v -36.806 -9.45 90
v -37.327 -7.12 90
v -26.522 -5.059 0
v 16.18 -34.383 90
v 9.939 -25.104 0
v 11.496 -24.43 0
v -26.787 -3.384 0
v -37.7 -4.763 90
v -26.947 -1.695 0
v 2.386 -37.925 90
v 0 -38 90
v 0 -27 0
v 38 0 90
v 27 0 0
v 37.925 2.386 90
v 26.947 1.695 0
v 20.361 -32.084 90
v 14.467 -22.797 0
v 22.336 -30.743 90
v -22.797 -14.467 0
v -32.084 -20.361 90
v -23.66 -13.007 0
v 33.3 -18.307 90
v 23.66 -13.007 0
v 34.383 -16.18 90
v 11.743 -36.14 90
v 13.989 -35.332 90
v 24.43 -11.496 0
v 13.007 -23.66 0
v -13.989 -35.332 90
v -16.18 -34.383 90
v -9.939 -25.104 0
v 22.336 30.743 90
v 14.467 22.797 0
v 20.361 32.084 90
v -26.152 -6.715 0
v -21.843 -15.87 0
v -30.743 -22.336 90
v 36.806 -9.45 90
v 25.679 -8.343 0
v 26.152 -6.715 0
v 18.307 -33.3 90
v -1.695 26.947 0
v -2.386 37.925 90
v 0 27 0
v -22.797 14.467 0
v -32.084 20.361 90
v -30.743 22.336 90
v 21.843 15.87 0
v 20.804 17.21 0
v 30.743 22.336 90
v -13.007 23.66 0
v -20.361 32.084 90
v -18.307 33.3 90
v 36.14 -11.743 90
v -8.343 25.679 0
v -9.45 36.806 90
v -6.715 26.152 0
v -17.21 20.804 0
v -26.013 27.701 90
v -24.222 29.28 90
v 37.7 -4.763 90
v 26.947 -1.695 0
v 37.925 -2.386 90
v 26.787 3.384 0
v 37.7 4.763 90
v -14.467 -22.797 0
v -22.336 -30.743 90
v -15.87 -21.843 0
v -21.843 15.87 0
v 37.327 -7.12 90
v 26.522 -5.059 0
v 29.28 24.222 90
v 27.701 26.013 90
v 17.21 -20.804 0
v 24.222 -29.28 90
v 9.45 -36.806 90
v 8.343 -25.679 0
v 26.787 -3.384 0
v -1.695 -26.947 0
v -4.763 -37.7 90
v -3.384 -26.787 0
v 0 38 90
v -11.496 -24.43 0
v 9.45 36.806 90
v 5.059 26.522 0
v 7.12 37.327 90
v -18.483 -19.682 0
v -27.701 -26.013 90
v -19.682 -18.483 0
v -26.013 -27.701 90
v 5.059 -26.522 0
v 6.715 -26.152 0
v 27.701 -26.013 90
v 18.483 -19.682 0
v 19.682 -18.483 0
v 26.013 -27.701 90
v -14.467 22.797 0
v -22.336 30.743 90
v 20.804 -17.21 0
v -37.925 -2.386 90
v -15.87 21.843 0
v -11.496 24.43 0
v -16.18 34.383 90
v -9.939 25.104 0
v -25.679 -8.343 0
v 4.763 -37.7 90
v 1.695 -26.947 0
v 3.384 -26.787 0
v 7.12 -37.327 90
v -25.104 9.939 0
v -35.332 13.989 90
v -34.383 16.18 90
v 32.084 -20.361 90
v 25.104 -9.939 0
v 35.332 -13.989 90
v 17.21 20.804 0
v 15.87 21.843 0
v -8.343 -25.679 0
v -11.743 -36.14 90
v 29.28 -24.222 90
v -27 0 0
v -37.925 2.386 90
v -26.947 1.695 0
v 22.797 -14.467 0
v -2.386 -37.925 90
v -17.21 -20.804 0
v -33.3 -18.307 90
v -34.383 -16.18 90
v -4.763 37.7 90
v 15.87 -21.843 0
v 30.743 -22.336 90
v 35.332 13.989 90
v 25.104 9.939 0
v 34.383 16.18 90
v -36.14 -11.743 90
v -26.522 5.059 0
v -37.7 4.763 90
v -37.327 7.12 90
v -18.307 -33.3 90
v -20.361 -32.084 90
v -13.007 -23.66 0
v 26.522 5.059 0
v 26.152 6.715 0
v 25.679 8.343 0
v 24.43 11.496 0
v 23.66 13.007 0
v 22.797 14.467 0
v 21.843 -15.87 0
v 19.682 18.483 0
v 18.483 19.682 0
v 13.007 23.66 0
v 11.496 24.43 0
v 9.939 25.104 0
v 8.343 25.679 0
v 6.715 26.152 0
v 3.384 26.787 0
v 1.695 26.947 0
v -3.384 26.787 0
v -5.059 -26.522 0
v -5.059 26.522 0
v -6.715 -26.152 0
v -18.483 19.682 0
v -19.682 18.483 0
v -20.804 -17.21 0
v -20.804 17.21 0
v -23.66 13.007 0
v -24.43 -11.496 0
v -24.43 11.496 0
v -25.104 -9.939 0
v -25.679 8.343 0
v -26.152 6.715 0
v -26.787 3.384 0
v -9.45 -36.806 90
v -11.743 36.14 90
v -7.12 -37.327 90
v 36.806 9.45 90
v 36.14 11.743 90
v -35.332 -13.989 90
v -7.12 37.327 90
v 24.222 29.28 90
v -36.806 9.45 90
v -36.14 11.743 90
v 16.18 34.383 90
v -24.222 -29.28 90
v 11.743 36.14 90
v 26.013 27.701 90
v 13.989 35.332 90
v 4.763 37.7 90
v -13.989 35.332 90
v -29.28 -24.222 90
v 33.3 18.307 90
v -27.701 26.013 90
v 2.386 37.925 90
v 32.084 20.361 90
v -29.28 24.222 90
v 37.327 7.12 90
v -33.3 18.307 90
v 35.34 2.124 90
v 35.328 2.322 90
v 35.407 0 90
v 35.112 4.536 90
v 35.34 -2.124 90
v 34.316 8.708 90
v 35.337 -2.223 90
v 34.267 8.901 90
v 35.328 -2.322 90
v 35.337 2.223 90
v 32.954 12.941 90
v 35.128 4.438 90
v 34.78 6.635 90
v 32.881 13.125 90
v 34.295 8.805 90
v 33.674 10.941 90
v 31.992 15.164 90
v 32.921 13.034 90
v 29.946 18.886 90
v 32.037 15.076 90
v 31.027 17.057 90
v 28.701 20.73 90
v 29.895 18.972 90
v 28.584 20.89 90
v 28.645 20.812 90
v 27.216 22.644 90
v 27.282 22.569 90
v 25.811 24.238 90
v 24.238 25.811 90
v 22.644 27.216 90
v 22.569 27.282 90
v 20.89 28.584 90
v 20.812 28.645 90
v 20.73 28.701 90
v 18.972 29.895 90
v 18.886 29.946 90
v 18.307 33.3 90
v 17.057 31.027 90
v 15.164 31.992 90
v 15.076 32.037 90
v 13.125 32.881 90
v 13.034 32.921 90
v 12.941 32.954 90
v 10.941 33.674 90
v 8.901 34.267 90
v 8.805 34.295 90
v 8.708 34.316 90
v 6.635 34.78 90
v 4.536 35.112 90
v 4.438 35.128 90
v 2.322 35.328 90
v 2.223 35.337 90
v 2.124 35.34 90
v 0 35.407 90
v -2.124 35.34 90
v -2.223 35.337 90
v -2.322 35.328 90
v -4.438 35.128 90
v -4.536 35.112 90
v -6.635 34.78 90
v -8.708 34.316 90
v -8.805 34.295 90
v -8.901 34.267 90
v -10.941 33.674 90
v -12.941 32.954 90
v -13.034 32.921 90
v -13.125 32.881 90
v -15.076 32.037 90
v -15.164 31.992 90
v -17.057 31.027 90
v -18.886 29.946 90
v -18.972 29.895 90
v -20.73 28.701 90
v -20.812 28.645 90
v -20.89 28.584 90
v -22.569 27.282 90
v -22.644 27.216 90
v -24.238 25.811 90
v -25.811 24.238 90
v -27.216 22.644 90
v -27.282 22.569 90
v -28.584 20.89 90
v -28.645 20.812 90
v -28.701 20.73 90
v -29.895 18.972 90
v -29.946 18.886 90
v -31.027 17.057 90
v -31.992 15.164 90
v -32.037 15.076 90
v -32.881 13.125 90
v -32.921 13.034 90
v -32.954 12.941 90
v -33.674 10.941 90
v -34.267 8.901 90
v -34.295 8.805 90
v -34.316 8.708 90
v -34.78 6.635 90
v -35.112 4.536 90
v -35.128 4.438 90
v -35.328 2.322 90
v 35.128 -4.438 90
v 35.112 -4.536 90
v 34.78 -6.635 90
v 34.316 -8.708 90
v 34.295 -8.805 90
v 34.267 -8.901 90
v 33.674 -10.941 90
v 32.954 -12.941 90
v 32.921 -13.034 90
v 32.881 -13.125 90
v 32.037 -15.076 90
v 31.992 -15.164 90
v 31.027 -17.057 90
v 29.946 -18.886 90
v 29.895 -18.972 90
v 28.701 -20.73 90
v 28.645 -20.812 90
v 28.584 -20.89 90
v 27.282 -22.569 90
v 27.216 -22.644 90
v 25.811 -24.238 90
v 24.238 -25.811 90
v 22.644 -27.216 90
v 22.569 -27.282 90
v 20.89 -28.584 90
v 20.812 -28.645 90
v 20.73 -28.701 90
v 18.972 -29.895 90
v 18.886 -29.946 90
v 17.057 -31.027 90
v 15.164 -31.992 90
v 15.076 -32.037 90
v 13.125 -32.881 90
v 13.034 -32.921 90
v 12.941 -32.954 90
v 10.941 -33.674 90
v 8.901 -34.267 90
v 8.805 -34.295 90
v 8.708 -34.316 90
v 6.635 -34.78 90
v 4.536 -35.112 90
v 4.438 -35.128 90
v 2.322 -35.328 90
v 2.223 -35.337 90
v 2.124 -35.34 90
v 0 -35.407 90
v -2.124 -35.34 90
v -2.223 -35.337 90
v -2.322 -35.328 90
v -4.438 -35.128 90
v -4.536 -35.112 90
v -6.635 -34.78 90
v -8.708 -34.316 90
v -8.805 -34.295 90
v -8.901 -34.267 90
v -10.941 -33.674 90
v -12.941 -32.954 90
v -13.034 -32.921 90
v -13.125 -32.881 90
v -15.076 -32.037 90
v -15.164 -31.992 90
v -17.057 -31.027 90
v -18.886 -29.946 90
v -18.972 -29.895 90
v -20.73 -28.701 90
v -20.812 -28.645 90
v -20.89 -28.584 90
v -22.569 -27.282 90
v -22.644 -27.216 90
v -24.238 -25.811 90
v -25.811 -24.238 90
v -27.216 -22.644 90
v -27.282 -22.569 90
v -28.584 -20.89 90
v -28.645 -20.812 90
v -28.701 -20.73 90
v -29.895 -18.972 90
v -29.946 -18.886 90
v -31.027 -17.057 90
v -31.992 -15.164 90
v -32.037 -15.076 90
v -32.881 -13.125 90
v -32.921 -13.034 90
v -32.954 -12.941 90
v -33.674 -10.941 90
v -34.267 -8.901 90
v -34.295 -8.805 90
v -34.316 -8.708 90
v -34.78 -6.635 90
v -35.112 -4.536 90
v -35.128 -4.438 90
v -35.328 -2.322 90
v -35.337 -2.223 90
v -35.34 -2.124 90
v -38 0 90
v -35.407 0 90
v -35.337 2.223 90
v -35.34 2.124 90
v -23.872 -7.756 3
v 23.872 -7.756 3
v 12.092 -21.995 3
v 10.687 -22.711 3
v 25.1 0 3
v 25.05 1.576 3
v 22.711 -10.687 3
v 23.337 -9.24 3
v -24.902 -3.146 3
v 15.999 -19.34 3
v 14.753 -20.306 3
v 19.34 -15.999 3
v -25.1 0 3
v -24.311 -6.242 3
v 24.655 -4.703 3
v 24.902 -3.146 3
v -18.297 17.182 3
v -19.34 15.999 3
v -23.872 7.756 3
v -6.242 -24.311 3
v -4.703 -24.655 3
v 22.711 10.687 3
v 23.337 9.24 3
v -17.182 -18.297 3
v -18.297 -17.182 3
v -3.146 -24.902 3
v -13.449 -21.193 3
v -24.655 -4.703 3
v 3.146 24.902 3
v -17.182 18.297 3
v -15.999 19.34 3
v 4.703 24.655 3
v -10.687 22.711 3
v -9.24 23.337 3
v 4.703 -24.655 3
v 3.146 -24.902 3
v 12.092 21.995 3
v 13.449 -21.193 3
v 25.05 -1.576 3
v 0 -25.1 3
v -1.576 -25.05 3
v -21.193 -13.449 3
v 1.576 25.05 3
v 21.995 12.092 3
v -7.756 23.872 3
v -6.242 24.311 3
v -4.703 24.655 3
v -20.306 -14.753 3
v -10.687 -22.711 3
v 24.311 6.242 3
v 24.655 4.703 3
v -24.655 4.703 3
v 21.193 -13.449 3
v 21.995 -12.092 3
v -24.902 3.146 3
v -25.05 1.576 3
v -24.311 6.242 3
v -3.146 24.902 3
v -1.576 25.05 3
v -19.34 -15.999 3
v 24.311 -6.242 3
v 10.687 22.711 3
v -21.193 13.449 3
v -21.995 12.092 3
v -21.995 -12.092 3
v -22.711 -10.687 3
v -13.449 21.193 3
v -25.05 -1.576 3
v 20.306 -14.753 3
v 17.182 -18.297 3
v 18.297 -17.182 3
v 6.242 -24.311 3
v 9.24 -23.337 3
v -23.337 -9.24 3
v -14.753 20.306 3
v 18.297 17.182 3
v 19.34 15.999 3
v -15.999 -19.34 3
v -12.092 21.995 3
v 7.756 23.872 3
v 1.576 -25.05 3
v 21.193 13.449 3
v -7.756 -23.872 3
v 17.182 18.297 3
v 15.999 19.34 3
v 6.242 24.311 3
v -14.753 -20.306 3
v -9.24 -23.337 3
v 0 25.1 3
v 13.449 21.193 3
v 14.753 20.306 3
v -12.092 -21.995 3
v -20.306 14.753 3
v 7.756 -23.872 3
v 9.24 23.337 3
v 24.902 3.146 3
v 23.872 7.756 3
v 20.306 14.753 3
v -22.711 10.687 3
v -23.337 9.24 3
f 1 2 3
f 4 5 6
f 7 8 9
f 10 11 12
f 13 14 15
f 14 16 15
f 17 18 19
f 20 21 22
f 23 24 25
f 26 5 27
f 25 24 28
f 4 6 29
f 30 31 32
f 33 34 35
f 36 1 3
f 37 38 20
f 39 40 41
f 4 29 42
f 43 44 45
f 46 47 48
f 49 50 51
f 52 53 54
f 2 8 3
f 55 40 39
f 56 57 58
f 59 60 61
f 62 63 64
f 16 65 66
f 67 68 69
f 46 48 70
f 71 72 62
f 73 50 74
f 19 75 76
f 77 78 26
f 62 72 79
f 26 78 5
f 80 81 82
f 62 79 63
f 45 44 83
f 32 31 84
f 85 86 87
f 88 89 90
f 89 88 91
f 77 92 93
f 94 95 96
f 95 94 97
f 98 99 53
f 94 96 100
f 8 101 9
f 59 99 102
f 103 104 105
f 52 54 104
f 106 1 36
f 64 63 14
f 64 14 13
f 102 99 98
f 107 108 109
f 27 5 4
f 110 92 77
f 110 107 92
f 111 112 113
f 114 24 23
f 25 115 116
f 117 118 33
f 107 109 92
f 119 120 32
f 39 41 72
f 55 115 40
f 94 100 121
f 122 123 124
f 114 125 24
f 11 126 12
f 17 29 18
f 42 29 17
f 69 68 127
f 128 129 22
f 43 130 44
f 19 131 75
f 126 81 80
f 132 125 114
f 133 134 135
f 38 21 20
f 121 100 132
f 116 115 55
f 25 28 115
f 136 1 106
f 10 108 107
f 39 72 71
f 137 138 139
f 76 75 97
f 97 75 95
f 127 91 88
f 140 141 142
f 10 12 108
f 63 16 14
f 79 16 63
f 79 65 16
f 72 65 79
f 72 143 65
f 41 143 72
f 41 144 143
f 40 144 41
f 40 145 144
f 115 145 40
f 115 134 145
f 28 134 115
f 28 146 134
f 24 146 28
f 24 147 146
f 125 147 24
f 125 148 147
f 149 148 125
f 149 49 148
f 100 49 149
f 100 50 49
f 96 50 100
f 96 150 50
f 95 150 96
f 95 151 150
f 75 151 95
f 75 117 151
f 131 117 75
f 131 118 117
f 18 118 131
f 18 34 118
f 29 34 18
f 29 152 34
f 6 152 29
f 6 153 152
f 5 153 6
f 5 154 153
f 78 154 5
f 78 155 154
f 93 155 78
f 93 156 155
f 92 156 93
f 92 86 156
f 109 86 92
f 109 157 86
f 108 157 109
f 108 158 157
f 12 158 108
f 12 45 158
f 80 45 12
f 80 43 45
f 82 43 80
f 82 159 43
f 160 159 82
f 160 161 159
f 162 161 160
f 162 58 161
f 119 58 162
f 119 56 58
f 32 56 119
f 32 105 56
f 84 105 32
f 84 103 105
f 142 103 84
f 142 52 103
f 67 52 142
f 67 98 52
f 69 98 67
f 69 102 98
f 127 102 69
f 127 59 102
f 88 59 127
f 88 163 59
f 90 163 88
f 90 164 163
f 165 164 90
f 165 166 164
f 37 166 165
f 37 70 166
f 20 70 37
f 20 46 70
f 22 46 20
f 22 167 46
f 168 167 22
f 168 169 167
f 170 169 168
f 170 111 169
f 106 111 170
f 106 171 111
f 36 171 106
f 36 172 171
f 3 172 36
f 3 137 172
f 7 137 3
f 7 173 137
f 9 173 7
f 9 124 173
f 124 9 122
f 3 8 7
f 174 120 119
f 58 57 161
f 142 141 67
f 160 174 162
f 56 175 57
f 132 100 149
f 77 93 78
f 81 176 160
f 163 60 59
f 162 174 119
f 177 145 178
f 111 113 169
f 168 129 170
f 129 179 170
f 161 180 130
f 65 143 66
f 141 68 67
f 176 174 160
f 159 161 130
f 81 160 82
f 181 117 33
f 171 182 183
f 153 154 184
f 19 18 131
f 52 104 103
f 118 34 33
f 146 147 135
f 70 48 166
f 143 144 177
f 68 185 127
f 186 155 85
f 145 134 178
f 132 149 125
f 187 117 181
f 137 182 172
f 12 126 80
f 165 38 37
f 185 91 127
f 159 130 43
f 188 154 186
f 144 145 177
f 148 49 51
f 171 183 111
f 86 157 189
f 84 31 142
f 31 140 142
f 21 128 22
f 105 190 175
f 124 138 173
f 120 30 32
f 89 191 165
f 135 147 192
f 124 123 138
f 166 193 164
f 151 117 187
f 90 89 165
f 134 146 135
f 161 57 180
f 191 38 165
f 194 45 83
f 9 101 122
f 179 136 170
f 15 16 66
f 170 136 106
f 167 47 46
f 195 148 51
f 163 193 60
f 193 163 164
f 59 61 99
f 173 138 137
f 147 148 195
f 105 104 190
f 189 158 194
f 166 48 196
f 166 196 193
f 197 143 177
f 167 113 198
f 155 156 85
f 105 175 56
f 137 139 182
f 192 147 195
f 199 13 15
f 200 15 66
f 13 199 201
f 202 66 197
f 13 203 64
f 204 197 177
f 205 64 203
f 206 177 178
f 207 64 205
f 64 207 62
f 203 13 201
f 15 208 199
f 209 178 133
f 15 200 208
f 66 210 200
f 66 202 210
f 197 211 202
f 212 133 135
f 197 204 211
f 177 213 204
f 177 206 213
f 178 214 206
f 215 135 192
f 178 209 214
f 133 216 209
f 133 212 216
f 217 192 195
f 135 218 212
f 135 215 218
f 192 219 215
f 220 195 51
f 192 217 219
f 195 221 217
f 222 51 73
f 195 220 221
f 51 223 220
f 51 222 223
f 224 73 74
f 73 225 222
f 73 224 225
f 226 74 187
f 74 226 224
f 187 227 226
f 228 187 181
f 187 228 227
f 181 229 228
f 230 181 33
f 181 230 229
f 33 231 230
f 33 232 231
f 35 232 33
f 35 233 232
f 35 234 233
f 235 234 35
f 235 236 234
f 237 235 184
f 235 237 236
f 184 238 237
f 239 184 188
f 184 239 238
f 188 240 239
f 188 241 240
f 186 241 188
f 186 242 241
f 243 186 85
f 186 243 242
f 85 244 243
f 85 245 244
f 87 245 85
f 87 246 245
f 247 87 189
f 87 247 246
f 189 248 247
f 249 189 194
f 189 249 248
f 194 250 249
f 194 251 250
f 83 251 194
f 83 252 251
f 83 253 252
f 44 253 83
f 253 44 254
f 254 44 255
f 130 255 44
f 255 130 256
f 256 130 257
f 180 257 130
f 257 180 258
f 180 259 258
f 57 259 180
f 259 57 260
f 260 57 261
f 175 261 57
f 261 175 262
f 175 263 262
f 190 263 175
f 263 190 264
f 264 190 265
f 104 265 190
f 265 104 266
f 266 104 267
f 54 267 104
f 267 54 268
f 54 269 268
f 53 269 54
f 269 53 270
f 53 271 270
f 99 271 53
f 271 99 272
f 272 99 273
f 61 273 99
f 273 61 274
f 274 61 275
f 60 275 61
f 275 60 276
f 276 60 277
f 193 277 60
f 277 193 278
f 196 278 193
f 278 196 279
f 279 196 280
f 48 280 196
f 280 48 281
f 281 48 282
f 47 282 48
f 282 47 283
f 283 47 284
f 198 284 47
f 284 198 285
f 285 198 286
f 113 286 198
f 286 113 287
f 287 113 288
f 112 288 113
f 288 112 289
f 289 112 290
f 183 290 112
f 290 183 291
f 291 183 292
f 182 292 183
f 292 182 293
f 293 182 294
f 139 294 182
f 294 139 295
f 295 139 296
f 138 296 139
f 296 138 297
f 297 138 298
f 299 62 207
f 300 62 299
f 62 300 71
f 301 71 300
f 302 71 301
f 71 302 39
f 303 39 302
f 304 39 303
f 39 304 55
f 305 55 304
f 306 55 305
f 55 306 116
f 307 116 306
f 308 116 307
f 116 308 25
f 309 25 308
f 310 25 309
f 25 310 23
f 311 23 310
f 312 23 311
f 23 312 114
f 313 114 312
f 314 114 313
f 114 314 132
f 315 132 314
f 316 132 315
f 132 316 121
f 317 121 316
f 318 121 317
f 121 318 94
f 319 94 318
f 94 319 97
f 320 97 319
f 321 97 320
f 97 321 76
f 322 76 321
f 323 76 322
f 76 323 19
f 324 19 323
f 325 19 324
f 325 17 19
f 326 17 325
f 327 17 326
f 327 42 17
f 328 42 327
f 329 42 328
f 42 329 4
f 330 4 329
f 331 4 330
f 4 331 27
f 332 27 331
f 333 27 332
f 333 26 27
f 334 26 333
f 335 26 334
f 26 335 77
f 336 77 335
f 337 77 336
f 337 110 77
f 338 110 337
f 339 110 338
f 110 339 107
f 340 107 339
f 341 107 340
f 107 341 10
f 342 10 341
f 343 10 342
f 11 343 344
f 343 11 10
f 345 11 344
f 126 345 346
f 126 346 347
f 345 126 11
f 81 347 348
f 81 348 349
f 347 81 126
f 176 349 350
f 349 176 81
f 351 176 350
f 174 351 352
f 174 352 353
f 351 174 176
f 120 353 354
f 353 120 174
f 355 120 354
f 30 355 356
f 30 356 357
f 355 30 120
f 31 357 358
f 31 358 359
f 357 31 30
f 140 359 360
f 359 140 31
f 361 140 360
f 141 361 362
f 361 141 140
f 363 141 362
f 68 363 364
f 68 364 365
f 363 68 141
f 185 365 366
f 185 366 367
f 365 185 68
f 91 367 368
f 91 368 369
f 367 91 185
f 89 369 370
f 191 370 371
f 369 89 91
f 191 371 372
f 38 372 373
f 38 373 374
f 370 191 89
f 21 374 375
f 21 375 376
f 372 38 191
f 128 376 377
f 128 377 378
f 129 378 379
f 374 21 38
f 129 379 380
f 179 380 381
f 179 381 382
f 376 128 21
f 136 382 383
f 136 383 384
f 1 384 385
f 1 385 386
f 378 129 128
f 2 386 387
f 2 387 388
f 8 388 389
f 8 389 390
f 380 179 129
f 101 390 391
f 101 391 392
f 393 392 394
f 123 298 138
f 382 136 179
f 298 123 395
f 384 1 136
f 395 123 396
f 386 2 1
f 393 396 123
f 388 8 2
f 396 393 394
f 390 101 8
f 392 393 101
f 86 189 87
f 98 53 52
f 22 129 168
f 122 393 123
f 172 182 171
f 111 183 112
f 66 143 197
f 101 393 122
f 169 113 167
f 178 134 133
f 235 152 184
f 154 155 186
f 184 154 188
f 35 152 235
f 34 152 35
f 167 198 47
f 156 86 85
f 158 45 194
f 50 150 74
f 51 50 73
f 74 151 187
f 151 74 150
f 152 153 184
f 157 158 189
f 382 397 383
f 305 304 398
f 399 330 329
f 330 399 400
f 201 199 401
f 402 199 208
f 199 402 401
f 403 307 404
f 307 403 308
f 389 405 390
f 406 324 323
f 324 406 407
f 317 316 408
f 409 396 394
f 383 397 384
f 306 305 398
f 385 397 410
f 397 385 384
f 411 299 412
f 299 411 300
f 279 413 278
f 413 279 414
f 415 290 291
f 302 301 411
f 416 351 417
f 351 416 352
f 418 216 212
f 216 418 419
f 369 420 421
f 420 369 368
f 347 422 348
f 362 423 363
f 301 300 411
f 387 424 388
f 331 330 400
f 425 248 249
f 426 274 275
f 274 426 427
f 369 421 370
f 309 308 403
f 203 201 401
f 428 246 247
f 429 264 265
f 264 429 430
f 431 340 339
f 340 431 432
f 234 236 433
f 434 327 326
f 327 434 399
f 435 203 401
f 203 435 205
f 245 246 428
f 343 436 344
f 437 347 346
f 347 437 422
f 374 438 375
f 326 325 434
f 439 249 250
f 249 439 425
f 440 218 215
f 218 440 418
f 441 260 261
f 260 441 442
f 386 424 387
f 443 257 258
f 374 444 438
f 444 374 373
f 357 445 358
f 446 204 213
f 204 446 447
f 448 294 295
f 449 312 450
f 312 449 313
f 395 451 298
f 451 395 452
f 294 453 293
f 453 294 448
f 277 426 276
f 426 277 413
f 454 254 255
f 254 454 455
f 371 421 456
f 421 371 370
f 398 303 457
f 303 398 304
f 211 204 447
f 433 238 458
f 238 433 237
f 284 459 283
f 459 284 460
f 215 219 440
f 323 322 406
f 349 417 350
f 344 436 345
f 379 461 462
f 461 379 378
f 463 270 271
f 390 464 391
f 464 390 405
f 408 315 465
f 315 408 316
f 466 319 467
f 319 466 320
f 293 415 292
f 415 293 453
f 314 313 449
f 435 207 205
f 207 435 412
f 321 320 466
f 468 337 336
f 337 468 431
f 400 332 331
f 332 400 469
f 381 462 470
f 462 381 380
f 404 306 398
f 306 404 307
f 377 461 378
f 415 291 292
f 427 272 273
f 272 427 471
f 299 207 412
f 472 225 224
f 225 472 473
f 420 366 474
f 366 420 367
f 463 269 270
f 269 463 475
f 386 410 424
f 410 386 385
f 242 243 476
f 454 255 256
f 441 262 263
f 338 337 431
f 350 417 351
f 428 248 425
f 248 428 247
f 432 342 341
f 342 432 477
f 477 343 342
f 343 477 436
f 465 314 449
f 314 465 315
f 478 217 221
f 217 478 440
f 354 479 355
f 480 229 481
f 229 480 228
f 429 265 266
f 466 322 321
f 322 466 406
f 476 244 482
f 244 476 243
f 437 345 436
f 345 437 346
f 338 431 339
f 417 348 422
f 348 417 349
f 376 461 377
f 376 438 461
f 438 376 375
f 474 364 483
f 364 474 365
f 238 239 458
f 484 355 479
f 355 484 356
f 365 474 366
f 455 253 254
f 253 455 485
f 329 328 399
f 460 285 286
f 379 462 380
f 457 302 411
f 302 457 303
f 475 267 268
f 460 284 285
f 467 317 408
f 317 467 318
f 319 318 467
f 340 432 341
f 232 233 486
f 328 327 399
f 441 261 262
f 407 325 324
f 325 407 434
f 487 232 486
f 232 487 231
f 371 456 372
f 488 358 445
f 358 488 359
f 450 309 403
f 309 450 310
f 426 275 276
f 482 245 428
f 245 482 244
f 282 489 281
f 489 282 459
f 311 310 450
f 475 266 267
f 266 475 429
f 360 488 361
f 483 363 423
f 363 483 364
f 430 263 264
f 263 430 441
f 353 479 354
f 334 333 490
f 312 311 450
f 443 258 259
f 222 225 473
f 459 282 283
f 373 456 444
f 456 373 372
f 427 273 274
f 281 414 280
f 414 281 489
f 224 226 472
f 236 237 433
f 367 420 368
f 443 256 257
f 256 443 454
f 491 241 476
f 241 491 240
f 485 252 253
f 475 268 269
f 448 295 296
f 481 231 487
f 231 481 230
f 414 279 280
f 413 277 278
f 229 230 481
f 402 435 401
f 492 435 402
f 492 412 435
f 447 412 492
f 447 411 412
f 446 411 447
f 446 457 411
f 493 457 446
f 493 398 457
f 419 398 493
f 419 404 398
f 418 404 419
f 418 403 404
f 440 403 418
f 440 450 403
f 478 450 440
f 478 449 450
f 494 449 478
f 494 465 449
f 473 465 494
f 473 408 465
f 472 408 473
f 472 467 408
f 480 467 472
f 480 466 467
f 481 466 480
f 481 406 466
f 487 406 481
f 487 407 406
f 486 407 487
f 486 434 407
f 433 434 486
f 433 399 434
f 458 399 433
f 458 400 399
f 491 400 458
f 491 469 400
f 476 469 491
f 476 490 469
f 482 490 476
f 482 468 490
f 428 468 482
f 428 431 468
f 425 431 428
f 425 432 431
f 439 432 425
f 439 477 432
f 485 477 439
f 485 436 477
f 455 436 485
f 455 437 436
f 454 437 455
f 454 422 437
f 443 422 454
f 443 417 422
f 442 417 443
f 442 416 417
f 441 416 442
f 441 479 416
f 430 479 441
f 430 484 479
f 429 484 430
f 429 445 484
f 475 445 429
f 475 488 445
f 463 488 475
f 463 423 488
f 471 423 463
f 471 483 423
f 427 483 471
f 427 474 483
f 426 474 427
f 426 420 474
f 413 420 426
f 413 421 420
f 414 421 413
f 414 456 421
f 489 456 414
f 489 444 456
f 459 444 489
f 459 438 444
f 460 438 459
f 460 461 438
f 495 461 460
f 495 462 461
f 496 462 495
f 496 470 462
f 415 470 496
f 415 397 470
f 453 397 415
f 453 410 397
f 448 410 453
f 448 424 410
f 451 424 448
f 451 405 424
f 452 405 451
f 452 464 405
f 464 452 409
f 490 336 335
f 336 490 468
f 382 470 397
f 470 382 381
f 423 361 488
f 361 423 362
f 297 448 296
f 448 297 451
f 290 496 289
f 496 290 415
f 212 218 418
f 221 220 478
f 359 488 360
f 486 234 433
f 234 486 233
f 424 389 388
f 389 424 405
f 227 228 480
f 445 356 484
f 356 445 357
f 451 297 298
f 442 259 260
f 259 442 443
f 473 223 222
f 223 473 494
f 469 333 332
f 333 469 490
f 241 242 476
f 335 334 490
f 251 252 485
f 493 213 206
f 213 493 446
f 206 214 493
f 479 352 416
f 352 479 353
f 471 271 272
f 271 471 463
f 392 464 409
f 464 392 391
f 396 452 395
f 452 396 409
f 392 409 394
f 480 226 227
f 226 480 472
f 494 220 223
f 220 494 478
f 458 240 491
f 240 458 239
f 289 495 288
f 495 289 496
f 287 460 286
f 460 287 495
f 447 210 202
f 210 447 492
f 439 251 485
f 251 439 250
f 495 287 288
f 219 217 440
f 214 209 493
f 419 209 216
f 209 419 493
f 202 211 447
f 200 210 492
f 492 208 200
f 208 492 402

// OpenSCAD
// Move the height of  the glass.
height =90; // [10:150]


// Move the first radius (bottom).
radius_bottom =27; // [5:75]

// Move the second radius (top).
radius_top =38; // [0:75]

// Move the thickness percent
thickness_percent=5; // [5:100]

thickness = radius_top*thickness_percent/100;

difference() {
cylinder ( h=height, r1=radius_bottom, r2=radius_top, $fn=100 ) ;
translate(v = [0, 0, 3])

cylinder ( h=height+thickness*1.5, r1=radius_bottom-thickness, r2=radius_top-thickness, $fn=100 ) ;
 }
